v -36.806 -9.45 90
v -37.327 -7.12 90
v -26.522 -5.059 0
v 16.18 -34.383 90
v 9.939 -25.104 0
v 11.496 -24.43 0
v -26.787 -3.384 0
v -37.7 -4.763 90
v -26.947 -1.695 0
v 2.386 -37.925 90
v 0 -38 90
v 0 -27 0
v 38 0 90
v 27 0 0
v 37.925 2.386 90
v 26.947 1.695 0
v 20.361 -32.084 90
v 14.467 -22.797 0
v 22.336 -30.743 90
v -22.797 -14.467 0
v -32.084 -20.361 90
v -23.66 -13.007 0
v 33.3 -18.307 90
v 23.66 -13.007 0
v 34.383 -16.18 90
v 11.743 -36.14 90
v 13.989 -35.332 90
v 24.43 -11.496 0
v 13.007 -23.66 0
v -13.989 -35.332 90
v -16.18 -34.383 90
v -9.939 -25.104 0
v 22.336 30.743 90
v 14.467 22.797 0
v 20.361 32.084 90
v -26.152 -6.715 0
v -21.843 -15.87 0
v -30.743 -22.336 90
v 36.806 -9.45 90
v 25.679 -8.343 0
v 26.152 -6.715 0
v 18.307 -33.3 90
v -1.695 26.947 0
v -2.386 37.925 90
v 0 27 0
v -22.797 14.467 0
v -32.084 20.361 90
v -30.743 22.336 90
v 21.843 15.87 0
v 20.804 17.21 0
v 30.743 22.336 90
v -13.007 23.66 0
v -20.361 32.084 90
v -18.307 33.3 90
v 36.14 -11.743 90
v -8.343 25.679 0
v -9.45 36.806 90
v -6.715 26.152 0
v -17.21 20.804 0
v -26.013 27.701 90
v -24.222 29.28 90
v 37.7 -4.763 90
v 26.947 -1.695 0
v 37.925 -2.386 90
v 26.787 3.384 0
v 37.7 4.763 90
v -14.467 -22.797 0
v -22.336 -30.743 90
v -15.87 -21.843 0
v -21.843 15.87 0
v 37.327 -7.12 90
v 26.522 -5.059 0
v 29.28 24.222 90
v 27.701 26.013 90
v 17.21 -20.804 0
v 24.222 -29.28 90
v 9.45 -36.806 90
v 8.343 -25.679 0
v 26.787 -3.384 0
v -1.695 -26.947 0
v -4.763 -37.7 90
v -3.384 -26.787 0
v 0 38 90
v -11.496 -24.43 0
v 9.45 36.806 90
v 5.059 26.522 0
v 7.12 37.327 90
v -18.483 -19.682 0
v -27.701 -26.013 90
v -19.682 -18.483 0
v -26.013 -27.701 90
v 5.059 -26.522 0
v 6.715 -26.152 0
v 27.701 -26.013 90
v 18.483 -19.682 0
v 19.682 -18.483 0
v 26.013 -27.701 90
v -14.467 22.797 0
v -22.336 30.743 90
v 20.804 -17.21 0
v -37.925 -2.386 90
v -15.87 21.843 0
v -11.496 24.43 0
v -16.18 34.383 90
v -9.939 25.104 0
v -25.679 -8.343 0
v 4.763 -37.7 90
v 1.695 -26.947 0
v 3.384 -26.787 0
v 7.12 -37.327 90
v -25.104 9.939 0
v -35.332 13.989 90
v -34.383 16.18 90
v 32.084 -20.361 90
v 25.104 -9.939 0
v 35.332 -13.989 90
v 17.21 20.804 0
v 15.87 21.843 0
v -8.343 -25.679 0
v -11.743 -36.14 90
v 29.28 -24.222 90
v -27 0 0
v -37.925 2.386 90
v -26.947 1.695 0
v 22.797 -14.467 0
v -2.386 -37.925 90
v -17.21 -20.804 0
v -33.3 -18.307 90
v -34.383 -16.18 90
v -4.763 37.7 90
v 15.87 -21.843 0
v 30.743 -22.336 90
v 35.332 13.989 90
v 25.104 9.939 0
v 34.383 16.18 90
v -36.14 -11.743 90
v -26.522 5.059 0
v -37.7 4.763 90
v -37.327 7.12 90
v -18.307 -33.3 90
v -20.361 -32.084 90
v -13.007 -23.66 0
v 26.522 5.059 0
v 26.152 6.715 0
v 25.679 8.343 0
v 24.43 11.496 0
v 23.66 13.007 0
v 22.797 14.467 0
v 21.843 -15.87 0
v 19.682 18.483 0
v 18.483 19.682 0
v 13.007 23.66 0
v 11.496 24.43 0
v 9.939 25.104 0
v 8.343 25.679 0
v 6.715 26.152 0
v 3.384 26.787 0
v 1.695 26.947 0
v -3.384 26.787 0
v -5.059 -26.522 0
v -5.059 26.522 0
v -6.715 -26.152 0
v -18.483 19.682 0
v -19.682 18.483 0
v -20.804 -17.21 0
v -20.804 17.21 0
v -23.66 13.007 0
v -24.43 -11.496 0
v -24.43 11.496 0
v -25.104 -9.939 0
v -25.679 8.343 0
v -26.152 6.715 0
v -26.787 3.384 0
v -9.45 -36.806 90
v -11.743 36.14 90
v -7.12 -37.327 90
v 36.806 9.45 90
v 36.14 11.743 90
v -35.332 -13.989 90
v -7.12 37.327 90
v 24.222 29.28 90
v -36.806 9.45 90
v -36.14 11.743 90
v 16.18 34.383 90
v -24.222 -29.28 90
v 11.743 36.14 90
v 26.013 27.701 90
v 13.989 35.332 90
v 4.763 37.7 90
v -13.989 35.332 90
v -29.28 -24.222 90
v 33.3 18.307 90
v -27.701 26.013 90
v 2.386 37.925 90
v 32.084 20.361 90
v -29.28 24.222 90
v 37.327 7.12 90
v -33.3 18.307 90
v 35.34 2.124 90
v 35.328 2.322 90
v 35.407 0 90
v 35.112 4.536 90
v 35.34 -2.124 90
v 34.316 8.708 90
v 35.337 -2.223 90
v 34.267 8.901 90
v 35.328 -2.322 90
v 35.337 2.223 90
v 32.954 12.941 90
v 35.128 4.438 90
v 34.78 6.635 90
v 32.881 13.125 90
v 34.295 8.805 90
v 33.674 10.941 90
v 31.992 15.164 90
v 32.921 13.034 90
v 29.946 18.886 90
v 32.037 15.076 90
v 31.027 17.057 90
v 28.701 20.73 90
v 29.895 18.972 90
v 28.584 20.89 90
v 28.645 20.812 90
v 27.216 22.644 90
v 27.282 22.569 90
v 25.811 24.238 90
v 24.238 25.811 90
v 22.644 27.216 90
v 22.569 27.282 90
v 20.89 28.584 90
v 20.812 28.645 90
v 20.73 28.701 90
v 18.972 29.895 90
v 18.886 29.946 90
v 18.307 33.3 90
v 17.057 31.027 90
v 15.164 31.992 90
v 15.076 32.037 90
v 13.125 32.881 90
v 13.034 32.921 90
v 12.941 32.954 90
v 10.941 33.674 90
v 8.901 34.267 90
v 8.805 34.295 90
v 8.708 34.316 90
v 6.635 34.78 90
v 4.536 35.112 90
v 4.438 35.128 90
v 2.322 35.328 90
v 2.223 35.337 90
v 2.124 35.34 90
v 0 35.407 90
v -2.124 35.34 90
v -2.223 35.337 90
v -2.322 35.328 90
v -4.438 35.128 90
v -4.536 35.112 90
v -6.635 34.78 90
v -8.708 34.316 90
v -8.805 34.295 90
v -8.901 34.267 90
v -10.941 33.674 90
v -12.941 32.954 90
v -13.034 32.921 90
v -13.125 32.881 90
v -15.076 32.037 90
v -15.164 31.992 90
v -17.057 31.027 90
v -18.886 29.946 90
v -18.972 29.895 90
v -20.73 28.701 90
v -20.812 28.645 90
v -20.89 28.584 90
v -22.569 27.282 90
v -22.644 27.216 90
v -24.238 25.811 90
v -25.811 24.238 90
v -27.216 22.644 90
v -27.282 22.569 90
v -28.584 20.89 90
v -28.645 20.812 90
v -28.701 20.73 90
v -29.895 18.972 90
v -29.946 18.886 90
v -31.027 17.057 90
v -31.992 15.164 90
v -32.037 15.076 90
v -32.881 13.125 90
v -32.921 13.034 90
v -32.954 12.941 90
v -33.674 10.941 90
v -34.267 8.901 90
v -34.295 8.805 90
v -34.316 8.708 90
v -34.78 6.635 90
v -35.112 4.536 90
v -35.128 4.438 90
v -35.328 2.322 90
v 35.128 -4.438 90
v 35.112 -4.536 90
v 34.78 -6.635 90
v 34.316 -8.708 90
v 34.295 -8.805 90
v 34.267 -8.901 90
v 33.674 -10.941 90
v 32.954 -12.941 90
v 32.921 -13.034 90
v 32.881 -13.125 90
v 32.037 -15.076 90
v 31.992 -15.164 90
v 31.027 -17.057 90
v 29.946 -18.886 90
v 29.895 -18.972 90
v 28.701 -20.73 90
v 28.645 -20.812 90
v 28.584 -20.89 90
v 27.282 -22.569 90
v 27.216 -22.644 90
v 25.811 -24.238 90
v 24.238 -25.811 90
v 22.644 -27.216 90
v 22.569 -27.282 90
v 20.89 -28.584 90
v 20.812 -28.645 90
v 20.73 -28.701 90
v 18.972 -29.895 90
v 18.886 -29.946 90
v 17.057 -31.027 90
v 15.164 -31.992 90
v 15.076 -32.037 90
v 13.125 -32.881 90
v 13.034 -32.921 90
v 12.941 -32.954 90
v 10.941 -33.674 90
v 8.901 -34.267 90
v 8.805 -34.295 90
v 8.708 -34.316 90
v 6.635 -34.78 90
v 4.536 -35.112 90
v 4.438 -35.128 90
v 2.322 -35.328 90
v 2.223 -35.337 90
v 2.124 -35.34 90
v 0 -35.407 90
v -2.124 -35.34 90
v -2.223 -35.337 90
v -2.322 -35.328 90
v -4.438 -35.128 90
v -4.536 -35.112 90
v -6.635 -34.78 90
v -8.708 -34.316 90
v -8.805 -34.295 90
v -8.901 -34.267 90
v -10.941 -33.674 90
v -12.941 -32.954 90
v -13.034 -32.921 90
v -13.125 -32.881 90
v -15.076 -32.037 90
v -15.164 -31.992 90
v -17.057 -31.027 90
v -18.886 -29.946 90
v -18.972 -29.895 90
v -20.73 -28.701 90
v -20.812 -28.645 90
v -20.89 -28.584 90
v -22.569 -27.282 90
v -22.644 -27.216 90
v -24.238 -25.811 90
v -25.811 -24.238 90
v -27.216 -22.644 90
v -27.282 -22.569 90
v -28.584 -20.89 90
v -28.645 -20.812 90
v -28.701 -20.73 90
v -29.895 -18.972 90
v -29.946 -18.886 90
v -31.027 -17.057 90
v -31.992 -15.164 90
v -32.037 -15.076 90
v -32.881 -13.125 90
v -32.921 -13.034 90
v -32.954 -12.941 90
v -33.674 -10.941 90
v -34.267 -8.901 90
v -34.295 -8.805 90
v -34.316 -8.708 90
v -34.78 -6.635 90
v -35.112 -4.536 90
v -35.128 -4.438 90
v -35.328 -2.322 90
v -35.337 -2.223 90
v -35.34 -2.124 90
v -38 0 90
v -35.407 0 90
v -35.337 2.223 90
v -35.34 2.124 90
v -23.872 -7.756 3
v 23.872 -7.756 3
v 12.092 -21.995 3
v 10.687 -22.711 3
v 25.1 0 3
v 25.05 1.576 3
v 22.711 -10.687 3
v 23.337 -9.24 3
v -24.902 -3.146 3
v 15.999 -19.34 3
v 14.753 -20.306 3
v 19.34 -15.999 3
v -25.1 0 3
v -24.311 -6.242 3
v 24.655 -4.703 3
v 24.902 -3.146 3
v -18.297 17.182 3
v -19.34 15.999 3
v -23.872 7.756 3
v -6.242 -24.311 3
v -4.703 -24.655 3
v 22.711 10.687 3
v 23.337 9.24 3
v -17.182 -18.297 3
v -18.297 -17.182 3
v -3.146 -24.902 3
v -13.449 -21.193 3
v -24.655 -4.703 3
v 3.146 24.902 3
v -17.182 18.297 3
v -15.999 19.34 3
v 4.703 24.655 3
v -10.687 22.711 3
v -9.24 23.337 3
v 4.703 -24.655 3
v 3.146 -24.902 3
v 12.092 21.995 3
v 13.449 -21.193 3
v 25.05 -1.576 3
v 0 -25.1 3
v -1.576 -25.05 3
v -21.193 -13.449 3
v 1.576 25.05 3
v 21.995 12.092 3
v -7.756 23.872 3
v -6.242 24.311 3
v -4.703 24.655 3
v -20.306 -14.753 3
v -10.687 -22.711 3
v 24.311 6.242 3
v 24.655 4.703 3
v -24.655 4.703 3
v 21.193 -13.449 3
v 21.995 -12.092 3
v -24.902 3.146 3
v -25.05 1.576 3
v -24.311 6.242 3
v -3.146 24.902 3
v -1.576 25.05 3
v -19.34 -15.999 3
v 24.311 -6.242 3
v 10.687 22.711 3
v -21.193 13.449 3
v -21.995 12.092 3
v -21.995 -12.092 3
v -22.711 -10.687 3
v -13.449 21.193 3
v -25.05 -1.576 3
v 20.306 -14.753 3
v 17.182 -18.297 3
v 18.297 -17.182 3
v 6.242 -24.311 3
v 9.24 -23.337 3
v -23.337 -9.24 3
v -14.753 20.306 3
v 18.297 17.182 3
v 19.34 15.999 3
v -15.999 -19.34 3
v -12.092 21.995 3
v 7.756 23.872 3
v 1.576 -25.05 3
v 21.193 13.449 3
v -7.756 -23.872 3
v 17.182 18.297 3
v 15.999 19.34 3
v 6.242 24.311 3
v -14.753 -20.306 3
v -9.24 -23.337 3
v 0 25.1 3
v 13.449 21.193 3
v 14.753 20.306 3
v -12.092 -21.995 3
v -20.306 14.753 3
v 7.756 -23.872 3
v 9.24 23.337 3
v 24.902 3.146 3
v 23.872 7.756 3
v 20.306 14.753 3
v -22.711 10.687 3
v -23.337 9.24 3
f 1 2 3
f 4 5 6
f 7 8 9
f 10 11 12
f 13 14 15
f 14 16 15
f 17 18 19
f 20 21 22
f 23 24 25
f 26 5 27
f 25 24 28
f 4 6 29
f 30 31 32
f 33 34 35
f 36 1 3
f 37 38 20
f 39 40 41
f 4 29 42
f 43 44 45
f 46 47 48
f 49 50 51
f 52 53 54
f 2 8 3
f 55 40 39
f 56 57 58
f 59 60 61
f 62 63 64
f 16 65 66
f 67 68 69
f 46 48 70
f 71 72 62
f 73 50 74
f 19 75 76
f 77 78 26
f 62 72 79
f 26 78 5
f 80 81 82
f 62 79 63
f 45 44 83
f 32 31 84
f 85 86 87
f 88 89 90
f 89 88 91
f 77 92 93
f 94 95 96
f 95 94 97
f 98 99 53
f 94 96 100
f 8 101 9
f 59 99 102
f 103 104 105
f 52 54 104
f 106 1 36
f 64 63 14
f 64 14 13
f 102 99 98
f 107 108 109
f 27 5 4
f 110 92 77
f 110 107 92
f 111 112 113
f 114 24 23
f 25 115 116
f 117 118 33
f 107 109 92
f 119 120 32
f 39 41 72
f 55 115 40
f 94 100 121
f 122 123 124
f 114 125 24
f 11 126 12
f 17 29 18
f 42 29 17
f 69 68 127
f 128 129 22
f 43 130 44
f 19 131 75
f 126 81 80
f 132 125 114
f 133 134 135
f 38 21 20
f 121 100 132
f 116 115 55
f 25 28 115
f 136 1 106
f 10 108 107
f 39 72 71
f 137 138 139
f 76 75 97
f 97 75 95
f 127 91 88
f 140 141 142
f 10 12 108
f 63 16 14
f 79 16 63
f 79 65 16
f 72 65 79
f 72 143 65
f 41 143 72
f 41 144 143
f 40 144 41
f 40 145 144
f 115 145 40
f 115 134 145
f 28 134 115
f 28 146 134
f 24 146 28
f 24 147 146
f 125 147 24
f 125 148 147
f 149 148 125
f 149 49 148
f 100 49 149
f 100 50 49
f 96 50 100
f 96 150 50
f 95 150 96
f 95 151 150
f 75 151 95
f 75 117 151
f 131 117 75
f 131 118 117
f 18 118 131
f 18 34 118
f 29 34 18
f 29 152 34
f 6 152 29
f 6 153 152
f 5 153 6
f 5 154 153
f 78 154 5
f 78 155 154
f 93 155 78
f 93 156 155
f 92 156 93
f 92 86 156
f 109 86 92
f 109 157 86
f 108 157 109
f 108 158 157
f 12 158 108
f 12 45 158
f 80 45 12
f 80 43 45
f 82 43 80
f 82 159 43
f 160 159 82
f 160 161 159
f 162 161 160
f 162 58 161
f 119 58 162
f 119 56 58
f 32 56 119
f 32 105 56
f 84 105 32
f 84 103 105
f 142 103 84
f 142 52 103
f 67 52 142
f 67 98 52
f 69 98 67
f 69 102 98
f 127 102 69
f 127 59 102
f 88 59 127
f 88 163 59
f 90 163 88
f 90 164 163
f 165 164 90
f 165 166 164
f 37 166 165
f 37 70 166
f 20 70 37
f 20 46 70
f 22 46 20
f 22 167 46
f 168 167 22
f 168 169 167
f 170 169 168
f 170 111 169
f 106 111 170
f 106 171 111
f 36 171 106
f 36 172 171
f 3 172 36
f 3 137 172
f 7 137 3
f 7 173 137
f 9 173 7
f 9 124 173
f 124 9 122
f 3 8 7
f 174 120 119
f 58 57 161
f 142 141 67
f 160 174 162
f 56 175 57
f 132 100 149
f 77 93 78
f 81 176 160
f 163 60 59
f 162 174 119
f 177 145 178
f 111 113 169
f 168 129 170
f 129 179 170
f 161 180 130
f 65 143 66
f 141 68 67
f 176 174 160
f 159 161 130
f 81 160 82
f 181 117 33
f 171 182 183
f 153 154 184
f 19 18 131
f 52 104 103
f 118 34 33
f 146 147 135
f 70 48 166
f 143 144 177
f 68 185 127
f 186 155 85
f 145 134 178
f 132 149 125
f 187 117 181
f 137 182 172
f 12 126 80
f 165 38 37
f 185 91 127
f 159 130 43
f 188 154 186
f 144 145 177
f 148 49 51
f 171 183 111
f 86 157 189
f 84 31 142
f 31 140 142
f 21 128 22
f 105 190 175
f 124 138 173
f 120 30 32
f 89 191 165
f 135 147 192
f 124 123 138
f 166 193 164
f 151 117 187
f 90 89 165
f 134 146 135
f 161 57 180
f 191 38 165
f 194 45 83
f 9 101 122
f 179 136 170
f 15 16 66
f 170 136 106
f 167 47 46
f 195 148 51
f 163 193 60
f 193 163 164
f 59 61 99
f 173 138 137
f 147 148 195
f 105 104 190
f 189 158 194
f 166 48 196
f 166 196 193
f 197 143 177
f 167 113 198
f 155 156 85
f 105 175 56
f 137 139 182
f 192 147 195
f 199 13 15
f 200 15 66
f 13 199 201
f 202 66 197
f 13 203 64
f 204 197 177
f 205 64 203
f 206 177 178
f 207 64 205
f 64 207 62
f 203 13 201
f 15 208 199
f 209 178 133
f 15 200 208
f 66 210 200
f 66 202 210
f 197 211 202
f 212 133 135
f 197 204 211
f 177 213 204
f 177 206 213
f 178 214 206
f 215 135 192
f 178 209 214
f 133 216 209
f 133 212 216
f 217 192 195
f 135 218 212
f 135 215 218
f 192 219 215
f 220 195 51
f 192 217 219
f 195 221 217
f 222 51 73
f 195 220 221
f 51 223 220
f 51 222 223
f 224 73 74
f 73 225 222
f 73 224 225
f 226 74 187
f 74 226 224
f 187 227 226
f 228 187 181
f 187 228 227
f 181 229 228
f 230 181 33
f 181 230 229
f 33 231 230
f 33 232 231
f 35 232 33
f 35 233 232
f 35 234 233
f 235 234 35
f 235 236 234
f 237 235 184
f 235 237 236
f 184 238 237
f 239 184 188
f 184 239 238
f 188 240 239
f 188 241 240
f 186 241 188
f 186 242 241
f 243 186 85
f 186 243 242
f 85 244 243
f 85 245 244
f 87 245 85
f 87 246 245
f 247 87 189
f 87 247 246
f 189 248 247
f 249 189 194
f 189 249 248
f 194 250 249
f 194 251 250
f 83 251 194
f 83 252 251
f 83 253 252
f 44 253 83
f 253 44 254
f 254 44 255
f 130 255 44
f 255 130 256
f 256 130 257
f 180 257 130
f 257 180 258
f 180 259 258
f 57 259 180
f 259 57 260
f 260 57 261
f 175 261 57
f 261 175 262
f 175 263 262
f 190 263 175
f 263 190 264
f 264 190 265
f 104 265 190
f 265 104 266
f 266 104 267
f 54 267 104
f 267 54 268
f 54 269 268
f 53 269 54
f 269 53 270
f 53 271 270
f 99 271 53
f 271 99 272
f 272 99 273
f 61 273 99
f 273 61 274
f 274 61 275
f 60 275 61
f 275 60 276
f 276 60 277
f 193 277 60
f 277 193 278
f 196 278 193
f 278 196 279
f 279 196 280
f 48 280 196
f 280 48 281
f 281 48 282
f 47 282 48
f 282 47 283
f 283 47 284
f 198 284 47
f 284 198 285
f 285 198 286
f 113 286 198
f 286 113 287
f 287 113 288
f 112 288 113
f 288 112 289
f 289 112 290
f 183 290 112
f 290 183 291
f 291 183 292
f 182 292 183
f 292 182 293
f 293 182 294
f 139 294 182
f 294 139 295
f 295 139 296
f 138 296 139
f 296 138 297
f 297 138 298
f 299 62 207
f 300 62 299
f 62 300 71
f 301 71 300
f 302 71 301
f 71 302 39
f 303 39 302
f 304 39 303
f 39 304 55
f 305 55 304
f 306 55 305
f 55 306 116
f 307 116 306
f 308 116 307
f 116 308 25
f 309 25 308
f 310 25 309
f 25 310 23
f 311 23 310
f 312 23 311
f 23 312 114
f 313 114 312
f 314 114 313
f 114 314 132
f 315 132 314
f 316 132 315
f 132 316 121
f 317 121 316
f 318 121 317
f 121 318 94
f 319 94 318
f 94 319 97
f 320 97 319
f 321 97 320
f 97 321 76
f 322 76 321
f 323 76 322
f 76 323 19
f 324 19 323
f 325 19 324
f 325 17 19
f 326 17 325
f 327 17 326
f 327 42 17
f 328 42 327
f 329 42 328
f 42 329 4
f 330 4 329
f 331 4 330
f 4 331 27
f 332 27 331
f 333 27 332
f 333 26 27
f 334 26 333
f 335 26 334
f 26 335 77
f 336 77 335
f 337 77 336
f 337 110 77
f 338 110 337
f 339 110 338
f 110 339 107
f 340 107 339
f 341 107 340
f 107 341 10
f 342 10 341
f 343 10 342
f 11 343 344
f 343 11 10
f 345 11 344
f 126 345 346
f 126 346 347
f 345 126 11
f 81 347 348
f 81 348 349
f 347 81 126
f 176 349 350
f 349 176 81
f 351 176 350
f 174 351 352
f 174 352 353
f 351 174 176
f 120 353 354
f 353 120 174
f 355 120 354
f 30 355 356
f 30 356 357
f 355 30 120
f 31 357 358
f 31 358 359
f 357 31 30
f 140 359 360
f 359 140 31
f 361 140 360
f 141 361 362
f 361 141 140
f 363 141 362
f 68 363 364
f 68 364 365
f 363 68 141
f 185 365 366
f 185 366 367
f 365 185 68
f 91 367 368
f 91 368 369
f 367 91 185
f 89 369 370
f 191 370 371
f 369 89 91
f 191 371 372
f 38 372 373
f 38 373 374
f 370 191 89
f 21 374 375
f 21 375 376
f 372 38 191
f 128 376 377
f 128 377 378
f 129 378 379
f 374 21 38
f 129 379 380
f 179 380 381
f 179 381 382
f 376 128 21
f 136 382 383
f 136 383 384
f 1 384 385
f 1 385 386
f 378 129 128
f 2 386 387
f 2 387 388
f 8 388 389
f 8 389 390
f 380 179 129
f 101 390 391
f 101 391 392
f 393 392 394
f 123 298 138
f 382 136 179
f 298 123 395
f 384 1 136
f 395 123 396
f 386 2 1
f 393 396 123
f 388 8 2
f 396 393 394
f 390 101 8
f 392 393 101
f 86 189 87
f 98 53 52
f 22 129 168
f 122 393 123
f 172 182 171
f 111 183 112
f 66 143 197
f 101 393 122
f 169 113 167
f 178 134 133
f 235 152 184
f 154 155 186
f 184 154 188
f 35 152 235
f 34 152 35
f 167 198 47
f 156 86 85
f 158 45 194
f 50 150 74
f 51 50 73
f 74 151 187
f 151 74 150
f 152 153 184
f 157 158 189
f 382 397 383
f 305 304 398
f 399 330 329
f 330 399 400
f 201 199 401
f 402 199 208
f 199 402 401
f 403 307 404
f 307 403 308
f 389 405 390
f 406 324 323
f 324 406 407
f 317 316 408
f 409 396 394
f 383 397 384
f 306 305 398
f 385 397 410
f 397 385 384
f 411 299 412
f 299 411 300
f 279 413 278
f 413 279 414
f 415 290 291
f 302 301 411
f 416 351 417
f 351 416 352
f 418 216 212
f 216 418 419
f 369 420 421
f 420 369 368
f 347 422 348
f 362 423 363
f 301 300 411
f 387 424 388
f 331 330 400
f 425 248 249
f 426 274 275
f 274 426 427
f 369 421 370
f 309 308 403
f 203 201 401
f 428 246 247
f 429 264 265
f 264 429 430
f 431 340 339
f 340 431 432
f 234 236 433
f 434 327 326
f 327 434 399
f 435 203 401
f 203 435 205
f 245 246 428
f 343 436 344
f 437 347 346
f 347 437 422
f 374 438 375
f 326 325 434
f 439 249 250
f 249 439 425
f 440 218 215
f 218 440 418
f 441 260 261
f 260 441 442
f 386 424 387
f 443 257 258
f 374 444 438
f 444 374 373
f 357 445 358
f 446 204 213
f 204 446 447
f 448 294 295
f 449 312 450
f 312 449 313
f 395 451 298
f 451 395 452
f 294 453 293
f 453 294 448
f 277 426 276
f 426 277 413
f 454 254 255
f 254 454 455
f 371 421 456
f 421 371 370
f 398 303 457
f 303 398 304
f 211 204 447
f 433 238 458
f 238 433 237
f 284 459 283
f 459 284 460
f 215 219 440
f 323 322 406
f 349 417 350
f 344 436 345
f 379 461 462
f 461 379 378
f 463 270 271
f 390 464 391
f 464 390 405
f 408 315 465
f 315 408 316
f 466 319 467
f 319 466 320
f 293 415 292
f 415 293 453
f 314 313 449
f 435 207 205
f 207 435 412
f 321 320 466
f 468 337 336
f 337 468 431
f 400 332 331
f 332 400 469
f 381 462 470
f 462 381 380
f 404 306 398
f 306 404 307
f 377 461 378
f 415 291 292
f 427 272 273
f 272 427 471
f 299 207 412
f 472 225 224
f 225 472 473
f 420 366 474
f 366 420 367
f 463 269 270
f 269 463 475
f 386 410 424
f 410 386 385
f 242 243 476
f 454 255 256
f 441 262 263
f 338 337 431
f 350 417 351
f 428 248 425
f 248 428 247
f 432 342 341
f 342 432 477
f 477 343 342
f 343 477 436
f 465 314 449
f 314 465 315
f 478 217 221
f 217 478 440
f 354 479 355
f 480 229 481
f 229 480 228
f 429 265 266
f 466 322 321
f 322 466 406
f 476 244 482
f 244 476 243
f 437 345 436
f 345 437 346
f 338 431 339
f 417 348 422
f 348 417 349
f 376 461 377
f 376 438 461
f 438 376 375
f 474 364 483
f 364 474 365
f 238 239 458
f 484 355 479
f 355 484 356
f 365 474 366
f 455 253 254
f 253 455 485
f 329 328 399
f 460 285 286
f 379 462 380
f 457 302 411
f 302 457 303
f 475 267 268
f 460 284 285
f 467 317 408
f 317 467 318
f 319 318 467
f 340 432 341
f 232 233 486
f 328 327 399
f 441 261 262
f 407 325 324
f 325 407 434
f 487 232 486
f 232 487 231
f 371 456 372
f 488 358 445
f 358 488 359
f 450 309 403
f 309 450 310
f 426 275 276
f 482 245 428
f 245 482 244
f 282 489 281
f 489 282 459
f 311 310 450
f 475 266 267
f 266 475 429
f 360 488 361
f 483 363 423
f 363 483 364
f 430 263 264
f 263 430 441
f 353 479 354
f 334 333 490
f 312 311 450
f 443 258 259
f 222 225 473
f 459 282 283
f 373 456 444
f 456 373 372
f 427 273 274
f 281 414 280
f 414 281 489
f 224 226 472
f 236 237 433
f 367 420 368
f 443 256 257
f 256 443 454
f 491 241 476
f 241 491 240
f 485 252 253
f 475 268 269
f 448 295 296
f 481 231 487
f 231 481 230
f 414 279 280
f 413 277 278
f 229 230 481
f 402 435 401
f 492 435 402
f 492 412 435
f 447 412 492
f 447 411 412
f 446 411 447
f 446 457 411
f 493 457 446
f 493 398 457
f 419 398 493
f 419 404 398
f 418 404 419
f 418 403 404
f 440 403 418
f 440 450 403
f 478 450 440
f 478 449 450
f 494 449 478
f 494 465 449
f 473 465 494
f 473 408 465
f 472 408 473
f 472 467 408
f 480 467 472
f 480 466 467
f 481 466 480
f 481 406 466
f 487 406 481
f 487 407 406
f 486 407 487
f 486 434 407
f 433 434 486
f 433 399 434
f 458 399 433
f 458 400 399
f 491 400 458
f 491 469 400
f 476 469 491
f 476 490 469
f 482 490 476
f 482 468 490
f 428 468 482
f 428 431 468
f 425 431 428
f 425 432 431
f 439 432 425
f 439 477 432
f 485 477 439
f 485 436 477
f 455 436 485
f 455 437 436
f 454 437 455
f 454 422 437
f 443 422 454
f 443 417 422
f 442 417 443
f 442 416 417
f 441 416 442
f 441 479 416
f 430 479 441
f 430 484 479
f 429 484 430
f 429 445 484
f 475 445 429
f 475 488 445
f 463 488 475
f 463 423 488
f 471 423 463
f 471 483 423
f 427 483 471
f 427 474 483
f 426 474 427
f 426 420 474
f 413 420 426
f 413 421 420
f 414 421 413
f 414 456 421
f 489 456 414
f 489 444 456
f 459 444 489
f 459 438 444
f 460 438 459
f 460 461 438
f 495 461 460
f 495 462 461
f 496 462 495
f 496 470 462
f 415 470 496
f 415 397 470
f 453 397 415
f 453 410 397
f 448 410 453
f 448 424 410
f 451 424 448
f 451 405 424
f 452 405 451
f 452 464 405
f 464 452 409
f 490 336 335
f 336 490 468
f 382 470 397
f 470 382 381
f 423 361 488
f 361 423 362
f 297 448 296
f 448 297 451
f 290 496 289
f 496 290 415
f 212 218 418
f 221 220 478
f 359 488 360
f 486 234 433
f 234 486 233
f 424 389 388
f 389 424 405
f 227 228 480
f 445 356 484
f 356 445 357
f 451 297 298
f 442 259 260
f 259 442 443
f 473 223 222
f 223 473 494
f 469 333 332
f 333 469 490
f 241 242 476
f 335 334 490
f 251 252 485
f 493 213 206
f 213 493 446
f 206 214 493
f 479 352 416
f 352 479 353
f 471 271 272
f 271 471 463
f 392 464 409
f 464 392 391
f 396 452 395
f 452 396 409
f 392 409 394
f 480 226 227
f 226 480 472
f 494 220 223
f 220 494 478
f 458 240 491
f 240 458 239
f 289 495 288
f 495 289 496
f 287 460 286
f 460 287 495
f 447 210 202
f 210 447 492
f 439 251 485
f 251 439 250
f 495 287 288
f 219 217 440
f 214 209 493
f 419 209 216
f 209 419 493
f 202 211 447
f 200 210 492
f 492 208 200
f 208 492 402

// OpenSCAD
// Move the height of  the glass.
height =90; // [10:150]


// Move the first radius (bottom).
radius_bottom =27; // [5:75]

// Move the second radius (top).
radius_top =38; // [0:75]

// Move the thickness percent
thickness_percent=5; // [5:100]

thickness = radius_top*thickness_percent/100;

difference() {
cylinder ( h=height, r1=radius_bottom, r2=radius_top, $fn=100 ) ;
translate(v = [0, 0, 3])

cylinder ( h=height+thickness*1.5, r1=radius_bottom-thickness, r2=radius_top-thickness, $fn=100 ) ;
 }
